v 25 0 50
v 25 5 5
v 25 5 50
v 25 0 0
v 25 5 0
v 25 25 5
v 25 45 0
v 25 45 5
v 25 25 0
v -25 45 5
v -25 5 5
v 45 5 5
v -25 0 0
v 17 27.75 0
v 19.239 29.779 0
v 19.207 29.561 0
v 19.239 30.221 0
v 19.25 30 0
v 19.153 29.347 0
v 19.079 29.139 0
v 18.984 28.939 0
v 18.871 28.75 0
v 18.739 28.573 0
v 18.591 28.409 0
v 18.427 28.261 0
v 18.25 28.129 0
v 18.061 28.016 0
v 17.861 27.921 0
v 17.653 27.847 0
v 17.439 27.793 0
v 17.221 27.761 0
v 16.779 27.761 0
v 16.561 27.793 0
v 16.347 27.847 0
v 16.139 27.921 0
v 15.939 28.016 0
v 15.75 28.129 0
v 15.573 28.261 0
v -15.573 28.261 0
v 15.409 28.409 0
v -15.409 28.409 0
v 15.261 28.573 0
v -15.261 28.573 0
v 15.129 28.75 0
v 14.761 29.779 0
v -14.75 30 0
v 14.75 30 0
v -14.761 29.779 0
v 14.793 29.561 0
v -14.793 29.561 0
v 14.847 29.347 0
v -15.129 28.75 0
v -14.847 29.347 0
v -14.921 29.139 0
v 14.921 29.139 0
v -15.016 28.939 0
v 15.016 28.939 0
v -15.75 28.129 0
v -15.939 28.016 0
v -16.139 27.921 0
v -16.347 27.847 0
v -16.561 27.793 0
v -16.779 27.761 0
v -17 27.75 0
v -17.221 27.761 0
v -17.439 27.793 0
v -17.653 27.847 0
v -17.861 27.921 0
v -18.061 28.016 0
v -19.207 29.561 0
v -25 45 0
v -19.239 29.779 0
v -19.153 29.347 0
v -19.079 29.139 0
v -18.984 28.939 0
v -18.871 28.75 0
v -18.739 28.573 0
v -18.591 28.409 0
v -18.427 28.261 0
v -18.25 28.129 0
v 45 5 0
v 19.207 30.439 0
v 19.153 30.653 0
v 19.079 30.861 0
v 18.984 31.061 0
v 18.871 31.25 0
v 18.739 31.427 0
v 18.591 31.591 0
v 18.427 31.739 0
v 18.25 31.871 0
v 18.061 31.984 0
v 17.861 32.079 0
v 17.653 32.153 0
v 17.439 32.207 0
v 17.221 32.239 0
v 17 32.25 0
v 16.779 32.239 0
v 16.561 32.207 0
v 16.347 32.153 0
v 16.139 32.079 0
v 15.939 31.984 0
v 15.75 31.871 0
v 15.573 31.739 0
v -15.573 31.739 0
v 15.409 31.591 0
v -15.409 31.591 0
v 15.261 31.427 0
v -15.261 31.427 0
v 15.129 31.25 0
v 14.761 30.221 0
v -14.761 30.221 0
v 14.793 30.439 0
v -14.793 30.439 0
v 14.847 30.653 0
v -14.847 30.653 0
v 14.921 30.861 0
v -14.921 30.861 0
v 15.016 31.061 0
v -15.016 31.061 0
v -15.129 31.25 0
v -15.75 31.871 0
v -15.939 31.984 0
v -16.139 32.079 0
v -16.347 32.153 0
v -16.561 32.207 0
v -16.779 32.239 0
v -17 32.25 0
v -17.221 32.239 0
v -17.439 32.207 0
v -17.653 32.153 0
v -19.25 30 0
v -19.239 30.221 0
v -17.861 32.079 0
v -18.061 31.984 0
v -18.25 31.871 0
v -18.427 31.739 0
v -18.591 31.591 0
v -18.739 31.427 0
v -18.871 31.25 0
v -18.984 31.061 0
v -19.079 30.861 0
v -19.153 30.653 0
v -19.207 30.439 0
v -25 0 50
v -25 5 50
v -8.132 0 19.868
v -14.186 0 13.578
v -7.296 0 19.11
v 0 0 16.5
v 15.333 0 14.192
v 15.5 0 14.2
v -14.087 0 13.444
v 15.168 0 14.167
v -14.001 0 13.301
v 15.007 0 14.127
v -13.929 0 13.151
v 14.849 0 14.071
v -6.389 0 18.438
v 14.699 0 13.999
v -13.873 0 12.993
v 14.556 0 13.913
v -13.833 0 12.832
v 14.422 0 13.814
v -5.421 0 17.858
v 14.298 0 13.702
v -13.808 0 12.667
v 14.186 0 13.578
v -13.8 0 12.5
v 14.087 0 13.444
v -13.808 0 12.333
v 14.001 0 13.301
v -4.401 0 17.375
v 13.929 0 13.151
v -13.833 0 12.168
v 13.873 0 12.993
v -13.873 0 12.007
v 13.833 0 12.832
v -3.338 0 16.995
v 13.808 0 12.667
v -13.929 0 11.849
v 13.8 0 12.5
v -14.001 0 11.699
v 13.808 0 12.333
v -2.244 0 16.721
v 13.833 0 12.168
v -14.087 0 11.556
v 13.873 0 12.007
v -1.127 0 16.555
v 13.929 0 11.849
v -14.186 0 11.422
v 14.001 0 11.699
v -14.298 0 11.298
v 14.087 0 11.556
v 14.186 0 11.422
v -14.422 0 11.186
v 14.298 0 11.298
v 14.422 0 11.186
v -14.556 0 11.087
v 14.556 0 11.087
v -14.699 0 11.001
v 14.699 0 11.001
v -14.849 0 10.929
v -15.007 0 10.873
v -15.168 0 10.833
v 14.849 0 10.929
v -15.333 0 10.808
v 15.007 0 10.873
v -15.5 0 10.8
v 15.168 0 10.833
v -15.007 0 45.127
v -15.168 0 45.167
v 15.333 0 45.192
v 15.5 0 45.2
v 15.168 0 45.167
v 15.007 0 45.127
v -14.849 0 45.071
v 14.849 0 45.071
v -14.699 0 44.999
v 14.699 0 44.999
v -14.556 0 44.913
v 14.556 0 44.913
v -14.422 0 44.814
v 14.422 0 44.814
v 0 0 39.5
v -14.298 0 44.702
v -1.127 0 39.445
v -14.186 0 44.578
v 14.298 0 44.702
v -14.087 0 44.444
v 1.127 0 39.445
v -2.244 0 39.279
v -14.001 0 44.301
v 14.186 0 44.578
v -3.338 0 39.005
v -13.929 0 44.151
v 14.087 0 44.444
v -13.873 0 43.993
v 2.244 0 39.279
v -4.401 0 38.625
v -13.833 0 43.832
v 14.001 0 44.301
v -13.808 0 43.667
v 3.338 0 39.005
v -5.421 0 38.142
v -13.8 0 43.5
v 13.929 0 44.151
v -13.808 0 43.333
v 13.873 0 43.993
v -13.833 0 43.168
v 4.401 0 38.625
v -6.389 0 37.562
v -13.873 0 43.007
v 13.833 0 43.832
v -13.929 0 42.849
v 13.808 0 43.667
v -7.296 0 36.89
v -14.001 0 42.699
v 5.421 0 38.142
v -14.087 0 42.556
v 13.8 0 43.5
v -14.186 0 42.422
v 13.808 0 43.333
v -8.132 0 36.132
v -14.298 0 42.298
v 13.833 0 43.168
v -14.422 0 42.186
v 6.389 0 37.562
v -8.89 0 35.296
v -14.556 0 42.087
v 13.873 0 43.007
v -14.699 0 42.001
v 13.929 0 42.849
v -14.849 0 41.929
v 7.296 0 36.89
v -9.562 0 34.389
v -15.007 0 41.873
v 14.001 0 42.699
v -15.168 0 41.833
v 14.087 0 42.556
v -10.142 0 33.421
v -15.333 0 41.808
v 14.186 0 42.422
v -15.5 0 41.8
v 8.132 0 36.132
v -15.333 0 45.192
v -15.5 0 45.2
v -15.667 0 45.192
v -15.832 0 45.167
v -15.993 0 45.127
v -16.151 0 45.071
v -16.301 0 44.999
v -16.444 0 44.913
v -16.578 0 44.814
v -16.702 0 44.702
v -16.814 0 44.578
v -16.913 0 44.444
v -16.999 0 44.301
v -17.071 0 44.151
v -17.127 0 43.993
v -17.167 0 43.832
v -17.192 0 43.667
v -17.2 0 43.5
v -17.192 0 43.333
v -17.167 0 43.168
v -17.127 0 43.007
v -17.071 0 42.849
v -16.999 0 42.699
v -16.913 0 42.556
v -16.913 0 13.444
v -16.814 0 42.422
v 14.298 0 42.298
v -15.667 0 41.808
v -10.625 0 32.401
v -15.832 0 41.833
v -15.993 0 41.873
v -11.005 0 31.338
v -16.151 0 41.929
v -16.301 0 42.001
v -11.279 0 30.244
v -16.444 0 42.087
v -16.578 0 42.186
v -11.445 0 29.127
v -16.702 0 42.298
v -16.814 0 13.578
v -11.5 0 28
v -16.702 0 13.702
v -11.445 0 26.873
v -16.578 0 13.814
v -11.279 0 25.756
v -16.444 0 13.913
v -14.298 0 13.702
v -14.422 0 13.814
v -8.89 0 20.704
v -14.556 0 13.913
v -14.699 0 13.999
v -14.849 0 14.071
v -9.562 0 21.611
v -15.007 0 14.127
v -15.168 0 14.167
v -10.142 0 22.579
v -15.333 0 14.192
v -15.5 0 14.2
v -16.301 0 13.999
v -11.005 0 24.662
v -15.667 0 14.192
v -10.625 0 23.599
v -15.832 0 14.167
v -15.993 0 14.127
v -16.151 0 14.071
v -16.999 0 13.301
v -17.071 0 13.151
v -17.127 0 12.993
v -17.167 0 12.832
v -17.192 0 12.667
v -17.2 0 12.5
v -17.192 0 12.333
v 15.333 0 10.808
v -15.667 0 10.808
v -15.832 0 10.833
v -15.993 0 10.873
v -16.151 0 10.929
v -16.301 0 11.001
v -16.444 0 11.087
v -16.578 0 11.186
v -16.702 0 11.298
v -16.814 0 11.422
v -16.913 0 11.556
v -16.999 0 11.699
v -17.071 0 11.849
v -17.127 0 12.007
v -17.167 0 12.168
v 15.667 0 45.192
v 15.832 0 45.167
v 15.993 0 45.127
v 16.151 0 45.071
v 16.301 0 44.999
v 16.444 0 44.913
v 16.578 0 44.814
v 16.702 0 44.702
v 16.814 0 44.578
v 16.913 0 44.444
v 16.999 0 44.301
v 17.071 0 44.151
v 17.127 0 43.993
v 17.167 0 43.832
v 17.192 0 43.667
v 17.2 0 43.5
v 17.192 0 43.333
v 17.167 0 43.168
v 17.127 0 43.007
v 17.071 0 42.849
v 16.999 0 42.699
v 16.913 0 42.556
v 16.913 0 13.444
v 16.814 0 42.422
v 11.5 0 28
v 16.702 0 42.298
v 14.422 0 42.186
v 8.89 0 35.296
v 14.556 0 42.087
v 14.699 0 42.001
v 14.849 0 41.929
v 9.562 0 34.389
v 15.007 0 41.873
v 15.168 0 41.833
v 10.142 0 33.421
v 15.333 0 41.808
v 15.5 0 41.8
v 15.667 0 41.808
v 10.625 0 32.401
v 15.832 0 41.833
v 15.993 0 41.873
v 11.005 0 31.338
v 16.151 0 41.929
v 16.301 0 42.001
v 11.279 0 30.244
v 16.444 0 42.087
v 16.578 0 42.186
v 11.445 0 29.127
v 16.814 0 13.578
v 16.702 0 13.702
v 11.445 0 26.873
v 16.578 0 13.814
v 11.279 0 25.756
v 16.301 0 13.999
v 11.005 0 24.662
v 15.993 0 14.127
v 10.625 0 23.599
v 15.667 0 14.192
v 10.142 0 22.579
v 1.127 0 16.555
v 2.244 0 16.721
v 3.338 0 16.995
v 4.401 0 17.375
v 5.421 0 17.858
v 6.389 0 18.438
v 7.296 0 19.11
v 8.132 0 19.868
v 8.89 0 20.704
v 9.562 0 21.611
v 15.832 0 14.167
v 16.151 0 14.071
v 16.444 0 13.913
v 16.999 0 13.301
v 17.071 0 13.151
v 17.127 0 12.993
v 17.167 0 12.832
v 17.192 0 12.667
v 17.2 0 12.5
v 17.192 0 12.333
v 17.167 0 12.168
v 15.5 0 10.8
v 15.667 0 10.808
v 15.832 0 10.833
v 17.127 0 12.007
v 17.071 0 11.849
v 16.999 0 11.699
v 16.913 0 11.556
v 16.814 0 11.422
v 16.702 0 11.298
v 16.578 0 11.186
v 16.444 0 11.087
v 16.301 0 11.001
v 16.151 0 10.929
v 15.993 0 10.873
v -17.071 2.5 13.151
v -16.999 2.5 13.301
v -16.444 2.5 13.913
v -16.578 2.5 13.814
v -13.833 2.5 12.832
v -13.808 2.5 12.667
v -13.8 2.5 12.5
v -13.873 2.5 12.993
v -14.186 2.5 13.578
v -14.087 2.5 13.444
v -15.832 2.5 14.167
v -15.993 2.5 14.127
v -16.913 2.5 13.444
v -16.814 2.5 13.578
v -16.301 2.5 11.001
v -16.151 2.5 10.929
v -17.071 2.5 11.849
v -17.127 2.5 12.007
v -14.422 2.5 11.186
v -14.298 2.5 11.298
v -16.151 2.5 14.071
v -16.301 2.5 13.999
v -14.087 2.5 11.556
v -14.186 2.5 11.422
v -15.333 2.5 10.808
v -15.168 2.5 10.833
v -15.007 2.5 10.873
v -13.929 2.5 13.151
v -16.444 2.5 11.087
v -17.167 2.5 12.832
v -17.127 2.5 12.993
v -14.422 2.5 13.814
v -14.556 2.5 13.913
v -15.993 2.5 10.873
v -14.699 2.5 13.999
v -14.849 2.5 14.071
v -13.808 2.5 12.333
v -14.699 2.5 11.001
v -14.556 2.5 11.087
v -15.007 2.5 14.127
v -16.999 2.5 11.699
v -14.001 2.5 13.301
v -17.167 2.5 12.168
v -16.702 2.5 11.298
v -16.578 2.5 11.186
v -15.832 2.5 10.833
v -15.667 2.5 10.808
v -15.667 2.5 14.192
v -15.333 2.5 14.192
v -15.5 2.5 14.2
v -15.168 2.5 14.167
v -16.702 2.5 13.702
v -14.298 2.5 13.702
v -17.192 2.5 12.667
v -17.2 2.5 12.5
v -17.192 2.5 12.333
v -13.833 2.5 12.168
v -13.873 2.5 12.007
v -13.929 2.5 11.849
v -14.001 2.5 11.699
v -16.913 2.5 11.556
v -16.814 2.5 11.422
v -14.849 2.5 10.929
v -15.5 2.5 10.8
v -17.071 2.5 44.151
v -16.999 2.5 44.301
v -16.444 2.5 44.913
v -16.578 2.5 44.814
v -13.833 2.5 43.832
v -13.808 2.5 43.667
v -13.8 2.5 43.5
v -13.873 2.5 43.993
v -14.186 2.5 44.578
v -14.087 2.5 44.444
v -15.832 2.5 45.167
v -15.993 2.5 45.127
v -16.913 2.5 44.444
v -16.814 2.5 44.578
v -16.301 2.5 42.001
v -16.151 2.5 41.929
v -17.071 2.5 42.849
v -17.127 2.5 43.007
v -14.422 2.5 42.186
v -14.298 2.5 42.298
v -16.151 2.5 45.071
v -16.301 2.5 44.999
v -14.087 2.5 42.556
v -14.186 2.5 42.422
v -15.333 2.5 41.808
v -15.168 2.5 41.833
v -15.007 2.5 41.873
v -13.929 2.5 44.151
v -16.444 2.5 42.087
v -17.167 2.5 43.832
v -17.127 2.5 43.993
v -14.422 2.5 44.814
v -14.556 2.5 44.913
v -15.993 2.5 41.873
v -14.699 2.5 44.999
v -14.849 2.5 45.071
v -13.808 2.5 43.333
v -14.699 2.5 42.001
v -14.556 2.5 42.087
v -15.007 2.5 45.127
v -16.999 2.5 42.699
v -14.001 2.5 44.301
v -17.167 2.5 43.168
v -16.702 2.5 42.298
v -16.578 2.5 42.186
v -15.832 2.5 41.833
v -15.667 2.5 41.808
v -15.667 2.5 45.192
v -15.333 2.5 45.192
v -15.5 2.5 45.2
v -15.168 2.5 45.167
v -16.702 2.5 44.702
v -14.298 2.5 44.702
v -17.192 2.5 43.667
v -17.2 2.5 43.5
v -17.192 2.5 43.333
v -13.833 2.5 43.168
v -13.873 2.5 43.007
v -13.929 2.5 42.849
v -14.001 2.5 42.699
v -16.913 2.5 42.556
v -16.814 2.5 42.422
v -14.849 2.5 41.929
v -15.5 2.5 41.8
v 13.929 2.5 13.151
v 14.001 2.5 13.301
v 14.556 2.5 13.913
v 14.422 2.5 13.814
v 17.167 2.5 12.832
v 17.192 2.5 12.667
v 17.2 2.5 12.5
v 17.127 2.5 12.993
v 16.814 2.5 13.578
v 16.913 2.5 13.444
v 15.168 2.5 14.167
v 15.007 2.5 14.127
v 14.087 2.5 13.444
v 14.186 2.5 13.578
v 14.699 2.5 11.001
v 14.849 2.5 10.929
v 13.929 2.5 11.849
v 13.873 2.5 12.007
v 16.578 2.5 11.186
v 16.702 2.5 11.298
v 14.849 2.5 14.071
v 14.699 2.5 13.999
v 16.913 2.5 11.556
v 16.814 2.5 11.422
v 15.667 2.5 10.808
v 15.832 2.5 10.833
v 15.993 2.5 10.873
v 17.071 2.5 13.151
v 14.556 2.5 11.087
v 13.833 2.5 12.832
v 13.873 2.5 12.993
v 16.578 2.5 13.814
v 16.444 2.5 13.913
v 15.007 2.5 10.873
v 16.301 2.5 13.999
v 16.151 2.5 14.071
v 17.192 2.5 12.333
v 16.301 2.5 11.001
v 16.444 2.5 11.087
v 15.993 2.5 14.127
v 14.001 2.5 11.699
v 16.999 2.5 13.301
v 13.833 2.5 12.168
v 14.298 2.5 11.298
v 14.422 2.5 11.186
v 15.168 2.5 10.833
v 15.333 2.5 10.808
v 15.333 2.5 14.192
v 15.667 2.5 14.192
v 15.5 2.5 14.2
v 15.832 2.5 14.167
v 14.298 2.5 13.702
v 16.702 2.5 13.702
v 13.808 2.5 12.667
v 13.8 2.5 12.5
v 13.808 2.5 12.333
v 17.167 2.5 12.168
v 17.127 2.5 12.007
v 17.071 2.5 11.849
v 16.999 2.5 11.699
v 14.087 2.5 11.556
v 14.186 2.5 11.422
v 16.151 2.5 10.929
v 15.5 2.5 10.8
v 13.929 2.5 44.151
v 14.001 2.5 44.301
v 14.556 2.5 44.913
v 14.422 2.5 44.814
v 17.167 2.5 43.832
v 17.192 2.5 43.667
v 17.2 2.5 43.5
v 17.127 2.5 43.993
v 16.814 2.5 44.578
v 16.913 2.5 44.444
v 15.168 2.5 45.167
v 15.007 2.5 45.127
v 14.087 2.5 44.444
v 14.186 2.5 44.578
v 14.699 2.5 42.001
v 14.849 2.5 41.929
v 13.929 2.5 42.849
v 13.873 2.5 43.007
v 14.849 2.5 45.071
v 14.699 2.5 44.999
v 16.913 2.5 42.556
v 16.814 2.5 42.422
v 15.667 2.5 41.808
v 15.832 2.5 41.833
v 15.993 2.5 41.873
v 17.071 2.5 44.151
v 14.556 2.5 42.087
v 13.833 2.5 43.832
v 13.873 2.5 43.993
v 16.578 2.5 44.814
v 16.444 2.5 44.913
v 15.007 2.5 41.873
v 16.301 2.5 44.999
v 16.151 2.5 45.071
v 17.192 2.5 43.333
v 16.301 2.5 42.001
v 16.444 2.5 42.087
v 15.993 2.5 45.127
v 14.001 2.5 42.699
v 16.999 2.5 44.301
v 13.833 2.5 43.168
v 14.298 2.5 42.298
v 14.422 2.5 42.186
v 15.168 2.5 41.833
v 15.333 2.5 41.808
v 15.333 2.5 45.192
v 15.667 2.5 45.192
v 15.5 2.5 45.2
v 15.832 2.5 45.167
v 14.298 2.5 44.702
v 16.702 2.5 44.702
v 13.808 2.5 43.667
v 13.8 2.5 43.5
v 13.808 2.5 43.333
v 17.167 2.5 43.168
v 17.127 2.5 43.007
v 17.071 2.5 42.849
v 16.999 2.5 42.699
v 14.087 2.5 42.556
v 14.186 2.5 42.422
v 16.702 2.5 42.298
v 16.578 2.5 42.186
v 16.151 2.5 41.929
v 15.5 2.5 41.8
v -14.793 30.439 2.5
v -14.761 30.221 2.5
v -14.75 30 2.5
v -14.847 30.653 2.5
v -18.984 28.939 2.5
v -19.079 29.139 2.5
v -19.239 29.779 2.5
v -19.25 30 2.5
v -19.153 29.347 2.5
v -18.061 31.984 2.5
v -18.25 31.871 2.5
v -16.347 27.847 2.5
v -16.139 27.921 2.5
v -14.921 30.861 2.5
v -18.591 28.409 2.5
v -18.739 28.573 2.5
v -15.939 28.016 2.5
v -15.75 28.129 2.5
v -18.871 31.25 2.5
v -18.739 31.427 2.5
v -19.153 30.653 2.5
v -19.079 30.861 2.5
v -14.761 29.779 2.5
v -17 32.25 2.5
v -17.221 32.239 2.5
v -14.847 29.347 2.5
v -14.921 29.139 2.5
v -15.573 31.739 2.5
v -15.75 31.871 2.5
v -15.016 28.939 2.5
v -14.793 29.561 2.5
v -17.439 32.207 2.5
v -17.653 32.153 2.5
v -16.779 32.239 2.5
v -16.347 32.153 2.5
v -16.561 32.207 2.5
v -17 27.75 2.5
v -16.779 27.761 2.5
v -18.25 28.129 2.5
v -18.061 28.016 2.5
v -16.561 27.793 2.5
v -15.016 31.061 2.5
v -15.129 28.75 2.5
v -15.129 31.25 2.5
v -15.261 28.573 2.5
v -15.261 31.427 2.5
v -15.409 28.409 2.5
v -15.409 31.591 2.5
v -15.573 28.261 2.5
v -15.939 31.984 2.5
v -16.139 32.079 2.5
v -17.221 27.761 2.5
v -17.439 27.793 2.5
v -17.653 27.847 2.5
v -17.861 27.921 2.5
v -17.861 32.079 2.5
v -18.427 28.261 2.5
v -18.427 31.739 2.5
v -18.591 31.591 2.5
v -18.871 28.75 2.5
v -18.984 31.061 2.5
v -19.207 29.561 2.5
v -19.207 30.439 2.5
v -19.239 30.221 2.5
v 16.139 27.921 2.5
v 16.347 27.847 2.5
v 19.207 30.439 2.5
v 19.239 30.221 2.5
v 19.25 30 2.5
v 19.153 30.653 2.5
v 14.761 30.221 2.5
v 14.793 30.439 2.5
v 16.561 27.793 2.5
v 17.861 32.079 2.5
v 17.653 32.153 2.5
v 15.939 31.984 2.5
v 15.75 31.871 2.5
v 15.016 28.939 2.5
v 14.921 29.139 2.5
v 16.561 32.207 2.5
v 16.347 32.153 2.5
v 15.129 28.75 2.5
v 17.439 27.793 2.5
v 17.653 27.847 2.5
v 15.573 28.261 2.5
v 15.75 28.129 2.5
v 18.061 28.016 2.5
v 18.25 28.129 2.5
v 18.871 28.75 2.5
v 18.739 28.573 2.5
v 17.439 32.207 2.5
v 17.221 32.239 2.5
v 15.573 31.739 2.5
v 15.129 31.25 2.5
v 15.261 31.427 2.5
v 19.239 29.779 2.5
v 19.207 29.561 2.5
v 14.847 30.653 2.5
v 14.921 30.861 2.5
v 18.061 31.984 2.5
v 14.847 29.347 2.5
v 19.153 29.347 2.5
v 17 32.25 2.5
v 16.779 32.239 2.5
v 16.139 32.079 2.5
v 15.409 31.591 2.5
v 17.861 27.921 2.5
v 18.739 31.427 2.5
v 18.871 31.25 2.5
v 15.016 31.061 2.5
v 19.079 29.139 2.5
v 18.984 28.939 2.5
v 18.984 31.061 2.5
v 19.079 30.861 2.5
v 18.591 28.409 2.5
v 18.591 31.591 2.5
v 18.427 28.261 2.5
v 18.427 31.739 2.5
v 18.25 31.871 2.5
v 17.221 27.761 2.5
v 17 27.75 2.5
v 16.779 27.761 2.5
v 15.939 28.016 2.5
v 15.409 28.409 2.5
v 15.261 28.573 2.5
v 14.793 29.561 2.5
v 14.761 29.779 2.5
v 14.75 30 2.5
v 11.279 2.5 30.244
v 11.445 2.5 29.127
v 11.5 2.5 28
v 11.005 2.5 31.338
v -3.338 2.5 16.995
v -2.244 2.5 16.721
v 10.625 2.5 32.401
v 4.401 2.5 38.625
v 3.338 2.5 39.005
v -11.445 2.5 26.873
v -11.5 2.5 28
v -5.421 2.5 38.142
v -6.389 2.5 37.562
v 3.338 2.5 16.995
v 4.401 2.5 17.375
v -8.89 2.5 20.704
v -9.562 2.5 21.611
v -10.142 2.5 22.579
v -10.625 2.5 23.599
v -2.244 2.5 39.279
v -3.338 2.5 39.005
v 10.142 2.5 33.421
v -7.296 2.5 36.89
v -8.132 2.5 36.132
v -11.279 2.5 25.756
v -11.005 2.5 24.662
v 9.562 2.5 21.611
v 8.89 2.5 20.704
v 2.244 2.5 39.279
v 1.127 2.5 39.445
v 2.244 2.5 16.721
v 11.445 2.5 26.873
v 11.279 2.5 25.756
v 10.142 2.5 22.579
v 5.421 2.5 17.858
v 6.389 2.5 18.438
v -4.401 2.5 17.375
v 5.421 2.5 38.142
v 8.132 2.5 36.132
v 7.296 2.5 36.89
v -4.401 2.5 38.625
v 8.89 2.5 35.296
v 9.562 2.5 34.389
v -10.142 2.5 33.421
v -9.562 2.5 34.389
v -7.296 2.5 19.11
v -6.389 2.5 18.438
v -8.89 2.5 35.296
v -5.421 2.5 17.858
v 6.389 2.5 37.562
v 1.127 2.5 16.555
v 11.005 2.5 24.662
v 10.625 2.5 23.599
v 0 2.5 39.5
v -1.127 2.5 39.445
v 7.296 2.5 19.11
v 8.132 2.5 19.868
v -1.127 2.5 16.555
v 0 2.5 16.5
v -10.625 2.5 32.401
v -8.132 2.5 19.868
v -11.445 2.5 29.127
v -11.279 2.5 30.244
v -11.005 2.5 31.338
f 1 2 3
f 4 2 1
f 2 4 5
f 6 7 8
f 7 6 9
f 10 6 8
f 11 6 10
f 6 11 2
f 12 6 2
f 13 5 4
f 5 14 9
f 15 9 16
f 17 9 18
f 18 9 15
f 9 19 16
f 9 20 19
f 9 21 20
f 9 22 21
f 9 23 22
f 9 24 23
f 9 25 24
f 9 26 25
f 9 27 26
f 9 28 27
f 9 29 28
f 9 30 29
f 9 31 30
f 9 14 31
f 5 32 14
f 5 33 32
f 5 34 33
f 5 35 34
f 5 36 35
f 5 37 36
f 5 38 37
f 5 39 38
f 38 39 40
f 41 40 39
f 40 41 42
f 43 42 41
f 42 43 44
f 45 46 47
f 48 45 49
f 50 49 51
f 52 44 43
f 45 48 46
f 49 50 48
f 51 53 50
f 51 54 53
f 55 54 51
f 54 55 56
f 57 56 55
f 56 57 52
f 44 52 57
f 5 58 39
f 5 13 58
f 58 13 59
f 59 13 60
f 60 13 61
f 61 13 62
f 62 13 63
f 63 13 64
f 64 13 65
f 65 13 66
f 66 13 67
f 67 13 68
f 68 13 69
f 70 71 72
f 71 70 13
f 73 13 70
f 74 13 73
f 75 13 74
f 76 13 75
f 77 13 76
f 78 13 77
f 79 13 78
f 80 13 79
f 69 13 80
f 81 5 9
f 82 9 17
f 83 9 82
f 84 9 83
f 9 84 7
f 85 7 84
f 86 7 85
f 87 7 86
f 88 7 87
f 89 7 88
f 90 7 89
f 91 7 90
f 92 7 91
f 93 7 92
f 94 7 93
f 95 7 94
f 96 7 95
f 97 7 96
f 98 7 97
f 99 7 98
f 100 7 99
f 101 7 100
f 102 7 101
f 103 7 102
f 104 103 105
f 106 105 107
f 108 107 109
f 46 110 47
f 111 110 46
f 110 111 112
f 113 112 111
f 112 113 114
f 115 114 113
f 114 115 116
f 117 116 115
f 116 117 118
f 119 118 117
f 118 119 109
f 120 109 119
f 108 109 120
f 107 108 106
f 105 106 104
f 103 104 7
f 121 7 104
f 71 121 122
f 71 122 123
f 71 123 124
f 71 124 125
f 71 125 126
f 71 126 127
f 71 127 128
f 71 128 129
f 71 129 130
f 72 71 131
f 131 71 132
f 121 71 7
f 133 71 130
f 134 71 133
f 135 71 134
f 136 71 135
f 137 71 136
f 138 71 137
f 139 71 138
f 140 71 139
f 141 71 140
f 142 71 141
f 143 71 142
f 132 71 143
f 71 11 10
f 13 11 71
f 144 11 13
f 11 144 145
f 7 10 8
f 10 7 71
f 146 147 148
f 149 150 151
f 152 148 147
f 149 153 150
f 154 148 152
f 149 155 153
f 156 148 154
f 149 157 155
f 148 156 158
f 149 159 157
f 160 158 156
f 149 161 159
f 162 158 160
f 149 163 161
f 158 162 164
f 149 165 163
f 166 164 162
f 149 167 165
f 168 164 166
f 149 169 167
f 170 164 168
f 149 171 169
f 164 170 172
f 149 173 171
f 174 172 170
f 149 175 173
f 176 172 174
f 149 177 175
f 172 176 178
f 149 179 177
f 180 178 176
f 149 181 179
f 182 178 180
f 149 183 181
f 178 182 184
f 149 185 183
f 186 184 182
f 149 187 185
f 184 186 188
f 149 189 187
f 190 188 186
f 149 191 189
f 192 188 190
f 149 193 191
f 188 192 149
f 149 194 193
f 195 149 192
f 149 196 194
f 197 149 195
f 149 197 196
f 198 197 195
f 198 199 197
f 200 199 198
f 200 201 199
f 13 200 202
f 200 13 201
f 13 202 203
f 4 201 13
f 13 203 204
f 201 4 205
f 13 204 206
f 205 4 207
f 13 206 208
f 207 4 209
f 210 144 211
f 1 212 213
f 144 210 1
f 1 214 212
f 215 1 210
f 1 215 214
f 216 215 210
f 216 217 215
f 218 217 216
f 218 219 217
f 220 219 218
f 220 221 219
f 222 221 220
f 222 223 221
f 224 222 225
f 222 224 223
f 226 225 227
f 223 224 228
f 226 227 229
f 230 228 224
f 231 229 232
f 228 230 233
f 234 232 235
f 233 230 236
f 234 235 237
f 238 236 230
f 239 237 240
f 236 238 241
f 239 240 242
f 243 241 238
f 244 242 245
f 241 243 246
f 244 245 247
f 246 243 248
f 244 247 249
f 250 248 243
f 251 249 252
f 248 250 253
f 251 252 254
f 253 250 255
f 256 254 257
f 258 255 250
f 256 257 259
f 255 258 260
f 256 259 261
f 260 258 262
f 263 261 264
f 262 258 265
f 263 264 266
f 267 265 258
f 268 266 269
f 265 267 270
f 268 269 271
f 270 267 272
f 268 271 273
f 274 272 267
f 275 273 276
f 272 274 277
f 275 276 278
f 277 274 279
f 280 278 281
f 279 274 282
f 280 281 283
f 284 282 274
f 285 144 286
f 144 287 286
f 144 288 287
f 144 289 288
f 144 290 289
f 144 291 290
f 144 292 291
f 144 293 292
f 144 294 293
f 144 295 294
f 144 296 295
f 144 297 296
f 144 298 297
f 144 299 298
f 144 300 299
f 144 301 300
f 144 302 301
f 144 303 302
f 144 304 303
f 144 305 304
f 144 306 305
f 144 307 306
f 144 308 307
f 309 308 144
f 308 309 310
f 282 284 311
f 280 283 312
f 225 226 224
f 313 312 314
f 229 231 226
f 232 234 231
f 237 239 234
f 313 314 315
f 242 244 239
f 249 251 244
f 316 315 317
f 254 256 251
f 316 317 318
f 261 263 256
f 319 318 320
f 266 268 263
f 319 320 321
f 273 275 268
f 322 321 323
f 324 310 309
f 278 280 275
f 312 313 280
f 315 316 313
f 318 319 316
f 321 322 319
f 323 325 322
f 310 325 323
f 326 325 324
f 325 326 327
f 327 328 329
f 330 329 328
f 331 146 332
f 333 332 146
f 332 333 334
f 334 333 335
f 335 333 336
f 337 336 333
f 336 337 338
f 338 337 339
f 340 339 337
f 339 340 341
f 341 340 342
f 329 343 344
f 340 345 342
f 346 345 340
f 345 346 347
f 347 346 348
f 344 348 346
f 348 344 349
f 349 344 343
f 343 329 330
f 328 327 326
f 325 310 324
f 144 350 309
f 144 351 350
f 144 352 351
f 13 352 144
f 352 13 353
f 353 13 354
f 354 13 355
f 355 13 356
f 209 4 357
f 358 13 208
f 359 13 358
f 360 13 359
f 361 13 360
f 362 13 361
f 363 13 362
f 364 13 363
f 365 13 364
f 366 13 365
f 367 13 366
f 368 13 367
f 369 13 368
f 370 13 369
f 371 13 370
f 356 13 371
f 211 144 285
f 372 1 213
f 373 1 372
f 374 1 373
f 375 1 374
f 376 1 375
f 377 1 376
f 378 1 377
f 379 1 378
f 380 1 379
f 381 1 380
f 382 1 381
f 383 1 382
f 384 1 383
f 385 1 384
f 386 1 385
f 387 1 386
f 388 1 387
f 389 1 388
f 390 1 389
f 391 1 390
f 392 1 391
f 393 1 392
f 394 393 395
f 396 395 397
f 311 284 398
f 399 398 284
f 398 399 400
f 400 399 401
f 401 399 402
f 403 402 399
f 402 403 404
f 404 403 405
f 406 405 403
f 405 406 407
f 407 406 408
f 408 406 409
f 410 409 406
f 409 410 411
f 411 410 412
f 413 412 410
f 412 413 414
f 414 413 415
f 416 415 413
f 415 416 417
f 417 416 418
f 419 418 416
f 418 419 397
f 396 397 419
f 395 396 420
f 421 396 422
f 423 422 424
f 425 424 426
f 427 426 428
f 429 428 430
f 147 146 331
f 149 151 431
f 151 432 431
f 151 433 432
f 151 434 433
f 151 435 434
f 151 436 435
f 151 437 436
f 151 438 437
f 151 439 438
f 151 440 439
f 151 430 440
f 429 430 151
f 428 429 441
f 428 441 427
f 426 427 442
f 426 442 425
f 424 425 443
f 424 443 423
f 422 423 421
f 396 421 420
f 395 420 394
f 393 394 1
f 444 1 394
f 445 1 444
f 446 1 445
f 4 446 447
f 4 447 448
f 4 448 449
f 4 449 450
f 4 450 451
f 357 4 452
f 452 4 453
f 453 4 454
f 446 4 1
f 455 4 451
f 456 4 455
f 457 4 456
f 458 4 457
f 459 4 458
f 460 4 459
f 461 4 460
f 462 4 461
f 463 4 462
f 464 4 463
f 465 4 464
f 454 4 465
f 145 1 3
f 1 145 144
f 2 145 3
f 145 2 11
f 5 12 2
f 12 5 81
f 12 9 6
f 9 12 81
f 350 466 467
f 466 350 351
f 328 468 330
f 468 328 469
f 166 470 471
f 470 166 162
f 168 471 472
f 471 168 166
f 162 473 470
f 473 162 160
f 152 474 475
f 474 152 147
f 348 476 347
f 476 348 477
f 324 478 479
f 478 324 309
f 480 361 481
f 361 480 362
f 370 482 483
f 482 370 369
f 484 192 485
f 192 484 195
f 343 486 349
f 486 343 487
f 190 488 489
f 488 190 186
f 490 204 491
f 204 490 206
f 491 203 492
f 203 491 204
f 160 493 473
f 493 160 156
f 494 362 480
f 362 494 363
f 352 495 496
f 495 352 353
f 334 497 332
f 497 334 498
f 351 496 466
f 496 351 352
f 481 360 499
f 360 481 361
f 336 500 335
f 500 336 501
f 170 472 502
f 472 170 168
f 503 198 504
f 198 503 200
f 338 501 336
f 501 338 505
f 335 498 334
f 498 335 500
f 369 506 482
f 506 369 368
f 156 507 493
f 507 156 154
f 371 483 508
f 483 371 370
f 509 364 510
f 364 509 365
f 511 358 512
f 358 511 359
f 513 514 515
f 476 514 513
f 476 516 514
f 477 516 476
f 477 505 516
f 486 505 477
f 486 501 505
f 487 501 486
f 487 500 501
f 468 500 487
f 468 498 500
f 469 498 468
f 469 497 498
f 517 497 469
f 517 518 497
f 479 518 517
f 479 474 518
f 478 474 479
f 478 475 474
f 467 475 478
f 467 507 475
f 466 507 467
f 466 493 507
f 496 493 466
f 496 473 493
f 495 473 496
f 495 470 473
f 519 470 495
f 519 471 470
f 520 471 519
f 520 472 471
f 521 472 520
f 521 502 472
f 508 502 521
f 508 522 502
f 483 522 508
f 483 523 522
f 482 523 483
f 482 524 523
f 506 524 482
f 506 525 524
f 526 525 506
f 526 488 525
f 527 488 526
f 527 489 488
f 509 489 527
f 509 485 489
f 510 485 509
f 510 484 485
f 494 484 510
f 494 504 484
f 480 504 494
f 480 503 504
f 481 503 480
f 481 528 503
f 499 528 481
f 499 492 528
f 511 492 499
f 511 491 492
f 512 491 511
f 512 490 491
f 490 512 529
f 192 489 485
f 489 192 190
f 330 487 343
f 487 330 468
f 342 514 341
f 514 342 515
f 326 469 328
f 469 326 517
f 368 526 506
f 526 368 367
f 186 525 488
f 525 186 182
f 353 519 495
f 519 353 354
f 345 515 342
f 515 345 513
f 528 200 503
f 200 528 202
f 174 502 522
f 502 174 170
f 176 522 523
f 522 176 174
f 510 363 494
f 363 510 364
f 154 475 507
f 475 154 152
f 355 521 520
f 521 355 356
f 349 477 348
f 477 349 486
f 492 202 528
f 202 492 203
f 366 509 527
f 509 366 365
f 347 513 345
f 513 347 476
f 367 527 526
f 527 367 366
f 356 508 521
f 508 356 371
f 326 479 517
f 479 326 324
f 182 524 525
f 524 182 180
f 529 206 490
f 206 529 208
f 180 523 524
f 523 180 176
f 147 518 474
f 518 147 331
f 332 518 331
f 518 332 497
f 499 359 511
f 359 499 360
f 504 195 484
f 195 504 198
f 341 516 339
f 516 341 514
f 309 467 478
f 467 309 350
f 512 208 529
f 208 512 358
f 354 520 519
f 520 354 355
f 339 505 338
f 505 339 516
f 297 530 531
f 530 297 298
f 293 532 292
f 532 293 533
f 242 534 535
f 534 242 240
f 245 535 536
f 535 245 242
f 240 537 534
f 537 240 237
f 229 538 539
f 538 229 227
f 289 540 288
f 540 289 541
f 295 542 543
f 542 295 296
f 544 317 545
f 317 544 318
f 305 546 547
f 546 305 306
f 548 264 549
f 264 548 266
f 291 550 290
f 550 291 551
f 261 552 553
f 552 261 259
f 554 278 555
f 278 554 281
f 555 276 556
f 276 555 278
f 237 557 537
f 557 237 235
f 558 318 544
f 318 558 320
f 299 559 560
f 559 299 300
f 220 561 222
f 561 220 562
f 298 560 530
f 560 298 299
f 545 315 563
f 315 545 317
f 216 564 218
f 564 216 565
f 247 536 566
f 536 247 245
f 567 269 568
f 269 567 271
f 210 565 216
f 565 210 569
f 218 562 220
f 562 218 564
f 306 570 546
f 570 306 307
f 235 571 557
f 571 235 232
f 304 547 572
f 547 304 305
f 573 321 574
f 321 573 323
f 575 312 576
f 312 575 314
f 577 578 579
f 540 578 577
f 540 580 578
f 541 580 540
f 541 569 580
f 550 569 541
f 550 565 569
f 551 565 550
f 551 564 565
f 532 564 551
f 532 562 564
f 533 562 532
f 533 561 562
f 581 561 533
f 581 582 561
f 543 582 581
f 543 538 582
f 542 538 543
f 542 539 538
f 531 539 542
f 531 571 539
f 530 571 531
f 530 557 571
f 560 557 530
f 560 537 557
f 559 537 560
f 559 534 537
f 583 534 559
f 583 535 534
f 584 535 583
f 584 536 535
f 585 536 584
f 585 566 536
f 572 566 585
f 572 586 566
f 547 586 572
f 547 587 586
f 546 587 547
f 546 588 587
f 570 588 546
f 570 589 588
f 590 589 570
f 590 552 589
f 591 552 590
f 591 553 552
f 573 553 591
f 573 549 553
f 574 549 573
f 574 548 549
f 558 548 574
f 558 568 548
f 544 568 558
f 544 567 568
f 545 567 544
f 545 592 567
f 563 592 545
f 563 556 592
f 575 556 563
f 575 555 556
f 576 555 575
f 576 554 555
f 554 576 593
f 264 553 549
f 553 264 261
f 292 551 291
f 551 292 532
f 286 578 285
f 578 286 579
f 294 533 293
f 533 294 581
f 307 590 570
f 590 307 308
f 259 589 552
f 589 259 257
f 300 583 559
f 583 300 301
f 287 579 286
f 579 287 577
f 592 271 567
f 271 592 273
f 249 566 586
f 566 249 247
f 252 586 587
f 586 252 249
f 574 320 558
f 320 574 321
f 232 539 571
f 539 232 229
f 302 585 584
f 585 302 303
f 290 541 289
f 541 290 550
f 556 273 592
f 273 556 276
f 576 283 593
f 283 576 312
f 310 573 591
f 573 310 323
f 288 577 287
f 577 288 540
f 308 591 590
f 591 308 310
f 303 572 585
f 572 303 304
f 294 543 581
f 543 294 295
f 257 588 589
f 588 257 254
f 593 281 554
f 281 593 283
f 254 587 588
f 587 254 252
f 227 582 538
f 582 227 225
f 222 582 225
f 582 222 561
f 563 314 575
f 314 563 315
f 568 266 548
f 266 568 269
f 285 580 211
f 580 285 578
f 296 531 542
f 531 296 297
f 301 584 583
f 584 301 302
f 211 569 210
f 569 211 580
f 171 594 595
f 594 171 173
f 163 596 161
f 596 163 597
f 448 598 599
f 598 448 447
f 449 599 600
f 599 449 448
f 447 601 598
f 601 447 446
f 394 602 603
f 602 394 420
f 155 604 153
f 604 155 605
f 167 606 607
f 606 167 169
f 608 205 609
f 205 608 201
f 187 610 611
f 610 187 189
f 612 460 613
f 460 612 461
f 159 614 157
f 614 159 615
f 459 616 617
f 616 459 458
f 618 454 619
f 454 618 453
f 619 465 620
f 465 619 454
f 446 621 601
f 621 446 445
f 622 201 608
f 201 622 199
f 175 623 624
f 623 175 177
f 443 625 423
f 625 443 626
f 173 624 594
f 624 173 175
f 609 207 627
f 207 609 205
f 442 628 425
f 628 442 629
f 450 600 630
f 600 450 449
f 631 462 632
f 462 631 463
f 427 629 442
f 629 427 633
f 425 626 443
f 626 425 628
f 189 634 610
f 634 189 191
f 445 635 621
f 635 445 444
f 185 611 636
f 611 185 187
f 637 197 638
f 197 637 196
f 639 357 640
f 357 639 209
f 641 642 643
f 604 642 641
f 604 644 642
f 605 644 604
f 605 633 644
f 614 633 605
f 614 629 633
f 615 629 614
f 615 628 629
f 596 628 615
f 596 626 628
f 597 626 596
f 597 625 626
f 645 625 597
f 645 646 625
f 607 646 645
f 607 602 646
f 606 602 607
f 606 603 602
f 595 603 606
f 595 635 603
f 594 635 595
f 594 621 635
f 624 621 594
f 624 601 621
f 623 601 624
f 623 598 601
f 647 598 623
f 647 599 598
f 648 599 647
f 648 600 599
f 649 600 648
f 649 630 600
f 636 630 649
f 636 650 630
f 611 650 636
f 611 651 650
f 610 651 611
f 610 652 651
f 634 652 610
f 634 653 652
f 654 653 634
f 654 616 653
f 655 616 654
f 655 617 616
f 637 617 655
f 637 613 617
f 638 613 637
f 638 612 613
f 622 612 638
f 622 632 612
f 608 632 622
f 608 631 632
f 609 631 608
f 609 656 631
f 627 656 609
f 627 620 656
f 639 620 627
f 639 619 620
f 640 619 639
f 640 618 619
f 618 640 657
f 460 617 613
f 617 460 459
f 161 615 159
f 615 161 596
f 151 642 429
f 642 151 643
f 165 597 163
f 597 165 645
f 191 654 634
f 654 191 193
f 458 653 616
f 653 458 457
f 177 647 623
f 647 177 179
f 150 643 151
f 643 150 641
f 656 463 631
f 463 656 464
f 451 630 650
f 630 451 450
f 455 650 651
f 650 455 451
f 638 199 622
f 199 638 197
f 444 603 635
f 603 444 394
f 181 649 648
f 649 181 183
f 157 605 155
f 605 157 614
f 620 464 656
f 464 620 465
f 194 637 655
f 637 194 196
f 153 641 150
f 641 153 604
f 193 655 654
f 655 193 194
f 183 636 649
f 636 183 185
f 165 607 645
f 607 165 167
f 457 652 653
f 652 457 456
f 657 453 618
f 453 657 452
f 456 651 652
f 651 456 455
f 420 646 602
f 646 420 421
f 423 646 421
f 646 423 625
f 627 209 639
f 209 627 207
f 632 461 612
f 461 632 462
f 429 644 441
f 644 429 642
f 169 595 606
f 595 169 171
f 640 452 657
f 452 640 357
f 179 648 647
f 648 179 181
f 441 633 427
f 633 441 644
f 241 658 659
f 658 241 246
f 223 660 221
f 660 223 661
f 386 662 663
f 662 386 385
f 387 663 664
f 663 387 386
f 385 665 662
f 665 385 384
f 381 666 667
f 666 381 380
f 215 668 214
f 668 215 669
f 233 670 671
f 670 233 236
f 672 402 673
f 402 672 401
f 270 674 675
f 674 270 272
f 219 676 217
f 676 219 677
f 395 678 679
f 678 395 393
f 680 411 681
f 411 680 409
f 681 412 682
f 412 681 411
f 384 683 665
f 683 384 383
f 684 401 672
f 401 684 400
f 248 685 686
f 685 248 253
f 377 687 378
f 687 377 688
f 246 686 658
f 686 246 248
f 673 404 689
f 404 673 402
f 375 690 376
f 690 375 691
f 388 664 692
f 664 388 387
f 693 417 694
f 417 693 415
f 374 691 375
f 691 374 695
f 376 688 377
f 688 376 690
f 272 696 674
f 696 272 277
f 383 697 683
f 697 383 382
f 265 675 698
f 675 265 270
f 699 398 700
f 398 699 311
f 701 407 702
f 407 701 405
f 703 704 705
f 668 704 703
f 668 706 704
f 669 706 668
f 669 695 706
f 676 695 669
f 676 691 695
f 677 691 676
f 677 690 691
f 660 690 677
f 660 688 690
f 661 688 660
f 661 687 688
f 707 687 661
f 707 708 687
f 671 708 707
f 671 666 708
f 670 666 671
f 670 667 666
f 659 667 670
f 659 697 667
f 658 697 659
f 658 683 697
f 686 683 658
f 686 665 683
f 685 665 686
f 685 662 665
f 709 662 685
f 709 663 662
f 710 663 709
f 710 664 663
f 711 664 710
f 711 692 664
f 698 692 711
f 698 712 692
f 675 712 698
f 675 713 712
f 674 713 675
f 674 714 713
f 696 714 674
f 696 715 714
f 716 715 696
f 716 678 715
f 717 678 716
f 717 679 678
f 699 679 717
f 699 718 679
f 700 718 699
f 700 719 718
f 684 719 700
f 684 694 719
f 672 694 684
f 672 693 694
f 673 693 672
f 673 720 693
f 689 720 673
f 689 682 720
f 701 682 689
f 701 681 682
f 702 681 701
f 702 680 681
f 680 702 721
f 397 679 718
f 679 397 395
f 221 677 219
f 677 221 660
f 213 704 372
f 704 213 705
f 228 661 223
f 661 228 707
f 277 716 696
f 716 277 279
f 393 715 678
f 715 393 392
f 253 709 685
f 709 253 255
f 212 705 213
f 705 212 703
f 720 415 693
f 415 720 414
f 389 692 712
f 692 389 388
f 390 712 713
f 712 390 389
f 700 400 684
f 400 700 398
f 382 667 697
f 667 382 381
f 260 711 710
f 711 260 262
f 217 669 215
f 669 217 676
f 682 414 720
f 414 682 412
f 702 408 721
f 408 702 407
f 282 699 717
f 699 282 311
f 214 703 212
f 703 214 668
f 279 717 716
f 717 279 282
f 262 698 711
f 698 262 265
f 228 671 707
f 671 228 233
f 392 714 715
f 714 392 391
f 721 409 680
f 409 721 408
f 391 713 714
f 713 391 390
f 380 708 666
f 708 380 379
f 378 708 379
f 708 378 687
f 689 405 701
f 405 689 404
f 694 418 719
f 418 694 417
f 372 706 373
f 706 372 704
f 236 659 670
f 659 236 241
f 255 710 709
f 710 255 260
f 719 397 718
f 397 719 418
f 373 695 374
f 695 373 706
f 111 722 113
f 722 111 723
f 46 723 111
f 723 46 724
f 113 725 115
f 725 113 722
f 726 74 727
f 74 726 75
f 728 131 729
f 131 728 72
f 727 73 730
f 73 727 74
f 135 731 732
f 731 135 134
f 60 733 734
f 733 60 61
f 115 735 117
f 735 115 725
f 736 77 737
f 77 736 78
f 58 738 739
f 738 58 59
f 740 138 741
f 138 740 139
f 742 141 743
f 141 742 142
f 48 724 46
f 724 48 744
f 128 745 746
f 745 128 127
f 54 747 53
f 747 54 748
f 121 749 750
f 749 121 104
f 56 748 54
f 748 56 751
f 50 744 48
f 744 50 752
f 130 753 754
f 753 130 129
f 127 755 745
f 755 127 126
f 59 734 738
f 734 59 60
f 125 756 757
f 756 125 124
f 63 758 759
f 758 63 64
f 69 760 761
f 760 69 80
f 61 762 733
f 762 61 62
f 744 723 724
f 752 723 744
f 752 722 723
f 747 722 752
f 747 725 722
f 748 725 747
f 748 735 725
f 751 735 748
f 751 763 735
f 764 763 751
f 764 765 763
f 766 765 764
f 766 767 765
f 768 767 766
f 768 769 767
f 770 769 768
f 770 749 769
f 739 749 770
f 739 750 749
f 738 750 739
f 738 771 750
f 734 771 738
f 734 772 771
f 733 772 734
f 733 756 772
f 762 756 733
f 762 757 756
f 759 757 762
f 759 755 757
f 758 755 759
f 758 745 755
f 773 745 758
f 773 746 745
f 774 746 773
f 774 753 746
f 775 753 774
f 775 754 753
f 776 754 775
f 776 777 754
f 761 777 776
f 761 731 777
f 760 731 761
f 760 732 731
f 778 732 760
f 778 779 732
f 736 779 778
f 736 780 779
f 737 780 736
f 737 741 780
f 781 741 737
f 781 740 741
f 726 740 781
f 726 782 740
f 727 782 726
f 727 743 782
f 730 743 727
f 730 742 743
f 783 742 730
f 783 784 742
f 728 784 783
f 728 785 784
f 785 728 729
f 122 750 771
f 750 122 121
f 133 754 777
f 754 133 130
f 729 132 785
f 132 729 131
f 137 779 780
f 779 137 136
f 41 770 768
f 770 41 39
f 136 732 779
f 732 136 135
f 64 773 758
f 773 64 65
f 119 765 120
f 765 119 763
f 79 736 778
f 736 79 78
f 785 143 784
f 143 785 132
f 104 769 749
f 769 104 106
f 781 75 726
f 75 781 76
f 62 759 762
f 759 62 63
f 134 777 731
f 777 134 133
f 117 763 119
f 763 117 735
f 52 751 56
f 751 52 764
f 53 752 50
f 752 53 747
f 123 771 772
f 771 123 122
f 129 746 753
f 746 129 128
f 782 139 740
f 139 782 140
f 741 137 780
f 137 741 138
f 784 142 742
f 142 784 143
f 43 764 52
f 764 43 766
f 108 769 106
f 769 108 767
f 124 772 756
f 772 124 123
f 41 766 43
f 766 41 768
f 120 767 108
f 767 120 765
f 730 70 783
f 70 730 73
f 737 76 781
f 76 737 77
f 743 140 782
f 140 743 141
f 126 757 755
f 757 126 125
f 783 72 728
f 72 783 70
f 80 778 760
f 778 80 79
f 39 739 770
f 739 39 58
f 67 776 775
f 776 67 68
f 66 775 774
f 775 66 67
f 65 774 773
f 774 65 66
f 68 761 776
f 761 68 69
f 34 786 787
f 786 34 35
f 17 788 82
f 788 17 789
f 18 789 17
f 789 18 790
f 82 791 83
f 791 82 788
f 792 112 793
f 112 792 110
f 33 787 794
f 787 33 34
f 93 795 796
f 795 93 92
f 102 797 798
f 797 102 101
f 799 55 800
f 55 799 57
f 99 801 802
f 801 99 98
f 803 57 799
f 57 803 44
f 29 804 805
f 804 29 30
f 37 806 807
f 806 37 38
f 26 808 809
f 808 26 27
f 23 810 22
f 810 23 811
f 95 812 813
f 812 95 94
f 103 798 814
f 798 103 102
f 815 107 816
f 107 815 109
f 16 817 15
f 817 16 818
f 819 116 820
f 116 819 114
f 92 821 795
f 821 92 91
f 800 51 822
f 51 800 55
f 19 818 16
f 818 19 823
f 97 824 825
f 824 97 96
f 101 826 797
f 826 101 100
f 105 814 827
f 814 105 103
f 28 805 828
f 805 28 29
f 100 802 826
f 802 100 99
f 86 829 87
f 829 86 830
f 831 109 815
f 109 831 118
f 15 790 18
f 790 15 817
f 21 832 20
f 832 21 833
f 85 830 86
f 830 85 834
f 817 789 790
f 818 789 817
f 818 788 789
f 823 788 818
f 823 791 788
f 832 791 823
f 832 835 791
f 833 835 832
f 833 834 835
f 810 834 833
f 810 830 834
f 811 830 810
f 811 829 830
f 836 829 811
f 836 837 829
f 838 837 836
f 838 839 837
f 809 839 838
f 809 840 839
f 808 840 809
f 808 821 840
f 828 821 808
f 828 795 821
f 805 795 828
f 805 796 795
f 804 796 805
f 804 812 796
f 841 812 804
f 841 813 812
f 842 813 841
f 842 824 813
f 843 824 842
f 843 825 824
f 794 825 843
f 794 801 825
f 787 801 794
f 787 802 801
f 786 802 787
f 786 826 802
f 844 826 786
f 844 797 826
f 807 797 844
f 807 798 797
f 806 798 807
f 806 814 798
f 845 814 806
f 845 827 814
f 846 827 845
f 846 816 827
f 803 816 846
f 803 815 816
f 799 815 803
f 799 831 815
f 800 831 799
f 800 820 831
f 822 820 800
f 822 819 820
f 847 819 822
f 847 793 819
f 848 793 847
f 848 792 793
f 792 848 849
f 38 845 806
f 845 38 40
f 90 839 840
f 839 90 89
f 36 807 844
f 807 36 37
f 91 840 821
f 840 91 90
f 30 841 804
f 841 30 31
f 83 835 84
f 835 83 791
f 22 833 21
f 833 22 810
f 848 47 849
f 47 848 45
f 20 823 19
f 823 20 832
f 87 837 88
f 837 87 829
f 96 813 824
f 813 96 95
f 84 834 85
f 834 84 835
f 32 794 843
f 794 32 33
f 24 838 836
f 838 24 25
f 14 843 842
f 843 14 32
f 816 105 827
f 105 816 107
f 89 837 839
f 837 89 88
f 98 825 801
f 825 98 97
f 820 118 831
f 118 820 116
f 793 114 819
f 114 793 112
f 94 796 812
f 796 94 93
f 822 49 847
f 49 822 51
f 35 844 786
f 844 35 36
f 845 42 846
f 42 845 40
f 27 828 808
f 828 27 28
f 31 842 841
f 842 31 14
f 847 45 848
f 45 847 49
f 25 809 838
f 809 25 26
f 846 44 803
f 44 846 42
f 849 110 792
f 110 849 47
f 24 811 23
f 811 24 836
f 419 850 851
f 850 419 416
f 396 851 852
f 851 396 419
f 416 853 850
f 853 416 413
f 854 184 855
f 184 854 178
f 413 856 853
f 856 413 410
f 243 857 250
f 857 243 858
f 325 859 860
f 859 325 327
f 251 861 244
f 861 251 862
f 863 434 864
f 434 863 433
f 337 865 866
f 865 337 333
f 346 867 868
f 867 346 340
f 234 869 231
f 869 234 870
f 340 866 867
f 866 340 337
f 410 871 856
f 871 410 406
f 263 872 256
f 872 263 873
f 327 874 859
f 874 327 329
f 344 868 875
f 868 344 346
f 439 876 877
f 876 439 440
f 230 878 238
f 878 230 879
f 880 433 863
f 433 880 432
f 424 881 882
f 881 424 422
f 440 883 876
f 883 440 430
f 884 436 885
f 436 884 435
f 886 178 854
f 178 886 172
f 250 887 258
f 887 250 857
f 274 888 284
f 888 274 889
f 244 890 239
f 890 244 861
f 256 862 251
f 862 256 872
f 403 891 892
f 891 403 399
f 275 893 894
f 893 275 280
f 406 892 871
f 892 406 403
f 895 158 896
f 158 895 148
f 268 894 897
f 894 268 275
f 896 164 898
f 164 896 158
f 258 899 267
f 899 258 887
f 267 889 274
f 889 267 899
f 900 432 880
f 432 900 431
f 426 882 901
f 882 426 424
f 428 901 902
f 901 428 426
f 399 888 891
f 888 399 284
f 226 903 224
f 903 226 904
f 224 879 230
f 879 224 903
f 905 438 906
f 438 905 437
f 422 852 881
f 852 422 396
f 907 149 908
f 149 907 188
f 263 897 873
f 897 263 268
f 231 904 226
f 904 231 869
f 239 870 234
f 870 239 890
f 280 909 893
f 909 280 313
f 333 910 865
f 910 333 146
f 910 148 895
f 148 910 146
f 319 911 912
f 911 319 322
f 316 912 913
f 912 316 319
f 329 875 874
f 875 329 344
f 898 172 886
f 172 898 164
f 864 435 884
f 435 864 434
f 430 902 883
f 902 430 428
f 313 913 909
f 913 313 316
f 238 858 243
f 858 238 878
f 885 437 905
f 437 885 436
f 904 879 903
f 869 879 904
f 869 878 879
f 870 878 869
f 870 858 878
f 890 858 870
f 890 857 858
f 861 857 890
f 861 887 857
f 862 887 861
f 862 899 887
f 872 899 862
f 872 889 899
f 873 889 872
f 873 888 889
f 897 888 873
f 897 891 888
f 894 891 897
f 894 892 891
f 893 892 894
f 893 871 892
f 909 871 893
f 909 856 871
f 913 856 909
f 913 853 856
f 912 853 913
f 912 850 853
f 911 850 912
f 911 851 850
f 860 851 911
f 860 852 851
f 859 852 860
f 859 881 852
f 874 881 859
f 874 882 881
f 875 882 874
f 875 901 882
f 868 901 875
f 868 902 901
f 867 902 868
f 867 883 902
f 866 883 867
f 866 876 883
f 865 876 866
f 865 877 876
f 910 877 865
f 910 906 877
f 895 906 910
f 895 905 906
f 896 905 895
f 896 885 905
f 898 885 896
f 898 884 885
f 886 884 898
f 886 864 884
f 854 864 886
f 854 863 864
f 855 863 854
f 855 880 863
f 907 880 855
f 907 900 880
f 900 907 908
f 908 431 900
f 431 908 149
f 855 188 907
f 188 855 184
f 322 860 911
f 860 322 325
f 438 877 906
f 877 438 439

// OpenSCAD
// L-shaped NEMA 17 Mounting Bracket for Syringe Pump
// Print orientation: Base on bed (XY plane), building up +Z.

// --- Dimensions ---
// Base Plate
base_x = 50;          // Total width (x from -25 to 25)
base_y = 45;          // Total depth (y from 0 to 45)
base_z = 5;           // Thickness

// Vertical Motor Plate
motor_plate_x = 50;   // Total width (x from -25 to 25)
motor_plate_y = 5;    // Thickness (y from 0 to 5)
motor_plate_z = 50;   // Height (z from 0 to 50)

// Base Holes (M4)
base_hole_dia = 4.5;
base_hole_offset_x = 17;
base_hole_offset_y = 30;

// Motor Plate Holes
boss_hole_dia = 23;
boss_hole_z = 28;     // Center height of boss hole

m3_hole_dia = 3.4;
m3_pattern_size = 31; // Square pattern size
m3_pattern_z = 28;    // Center height of M3 pattern

// Gussets
gusset_thickness = 5;
gusset_leg = 20;      // Length of triangle legs
gusset_x_start = 20;  // Gussets are at x=20..25 and x=-25..-20

// --- Rendering Settings ---
$fn = 64;

// --- Main Structure ---
difference() {
    union() {
        // 1. Base Plate
        // Centered at x=0, y=base_y/2, z=base_z/2
        // Spec: x from -25 to 25, y from 0 to 45, z from 0 to 5
        translate([-base_x/2, 0, 0])
            cube([base_x, base_y, base_z]);

        // 2. Vertical Motor Plate
        // Stands on the back edge of the base (y=0 to y=5)
        // Spec: x from -25 to 25, y from 0 to 5, z from 0 to 50
        translate([-motor_plate_x/2, 0, 0])
            cube([motor_plate_x, motor_plate_y, motor_plate_z]);

        // 3. Left Gusset
        // Right triangle in YZ plane, right angle at (y=5, z=5)
        // Legs go +Y (to 25) and +Z (to 25)
        // Located at x = -25 to -20
        translate([-25, 0, 0])
            linear_extrude(height = 5, convexity = 10)
            polygon(points = [[5,5], [25,5], [5,25]], paths = [[0,1,2]]);

        // 4. Right Gusset
        // Located at x = 20 to 25
        translate([20, 0, 0])
            linear_extrude(height = 5, convexity = 10)
            polygon(points = [[5,5], [25,5], [5,25]], paths = [[0,1,2]]);
    }

    // --- Cuts ---

    // 1. Base Plate Holes (M4)
    // Hole 1: x = -17, y = 30
    translate([-17, 30, -0.1])
        cylinder(h = base_z + 0.2, r = base_hole_dia/2, center = true);

    // Hole 2: x = 17, y = 30
    translate([17, 30, -0.1])
        cylinder(h = base_z + 0.2, r = base_hole_dia/2, center = true);

    // 2. Motor Plate Boss Hole (23mm)
    // Center at x=0, z=28. Cuts through Y (thickness 5).
    // Cylinder axis along Y.
    translate([0, -0.1, boss_hole_z])
        rotate([90, 0, 0])
        cylinder(h = motor_plate_y + 0.2, r = boss_hole_dia/2, center = true);

    // 3. Motor Plate M3 Holes (31mm square pattern)
    // Center at x=0, z=28.
    // Pattern corners: x = +/- 15.5, z = 28 +/- 15.5
    for (dx = [-15.5, 15.5]) {
        for (dz = [-15.5, 15.5]) {
            translate([dx, -0.1, m3_pattern_z + dz])
                rotate([90, 0, 0])
                cylinder(h = motor_plate_y + 0.2, r = m3_hole_dia/2, center = true);
        }
    }
}
